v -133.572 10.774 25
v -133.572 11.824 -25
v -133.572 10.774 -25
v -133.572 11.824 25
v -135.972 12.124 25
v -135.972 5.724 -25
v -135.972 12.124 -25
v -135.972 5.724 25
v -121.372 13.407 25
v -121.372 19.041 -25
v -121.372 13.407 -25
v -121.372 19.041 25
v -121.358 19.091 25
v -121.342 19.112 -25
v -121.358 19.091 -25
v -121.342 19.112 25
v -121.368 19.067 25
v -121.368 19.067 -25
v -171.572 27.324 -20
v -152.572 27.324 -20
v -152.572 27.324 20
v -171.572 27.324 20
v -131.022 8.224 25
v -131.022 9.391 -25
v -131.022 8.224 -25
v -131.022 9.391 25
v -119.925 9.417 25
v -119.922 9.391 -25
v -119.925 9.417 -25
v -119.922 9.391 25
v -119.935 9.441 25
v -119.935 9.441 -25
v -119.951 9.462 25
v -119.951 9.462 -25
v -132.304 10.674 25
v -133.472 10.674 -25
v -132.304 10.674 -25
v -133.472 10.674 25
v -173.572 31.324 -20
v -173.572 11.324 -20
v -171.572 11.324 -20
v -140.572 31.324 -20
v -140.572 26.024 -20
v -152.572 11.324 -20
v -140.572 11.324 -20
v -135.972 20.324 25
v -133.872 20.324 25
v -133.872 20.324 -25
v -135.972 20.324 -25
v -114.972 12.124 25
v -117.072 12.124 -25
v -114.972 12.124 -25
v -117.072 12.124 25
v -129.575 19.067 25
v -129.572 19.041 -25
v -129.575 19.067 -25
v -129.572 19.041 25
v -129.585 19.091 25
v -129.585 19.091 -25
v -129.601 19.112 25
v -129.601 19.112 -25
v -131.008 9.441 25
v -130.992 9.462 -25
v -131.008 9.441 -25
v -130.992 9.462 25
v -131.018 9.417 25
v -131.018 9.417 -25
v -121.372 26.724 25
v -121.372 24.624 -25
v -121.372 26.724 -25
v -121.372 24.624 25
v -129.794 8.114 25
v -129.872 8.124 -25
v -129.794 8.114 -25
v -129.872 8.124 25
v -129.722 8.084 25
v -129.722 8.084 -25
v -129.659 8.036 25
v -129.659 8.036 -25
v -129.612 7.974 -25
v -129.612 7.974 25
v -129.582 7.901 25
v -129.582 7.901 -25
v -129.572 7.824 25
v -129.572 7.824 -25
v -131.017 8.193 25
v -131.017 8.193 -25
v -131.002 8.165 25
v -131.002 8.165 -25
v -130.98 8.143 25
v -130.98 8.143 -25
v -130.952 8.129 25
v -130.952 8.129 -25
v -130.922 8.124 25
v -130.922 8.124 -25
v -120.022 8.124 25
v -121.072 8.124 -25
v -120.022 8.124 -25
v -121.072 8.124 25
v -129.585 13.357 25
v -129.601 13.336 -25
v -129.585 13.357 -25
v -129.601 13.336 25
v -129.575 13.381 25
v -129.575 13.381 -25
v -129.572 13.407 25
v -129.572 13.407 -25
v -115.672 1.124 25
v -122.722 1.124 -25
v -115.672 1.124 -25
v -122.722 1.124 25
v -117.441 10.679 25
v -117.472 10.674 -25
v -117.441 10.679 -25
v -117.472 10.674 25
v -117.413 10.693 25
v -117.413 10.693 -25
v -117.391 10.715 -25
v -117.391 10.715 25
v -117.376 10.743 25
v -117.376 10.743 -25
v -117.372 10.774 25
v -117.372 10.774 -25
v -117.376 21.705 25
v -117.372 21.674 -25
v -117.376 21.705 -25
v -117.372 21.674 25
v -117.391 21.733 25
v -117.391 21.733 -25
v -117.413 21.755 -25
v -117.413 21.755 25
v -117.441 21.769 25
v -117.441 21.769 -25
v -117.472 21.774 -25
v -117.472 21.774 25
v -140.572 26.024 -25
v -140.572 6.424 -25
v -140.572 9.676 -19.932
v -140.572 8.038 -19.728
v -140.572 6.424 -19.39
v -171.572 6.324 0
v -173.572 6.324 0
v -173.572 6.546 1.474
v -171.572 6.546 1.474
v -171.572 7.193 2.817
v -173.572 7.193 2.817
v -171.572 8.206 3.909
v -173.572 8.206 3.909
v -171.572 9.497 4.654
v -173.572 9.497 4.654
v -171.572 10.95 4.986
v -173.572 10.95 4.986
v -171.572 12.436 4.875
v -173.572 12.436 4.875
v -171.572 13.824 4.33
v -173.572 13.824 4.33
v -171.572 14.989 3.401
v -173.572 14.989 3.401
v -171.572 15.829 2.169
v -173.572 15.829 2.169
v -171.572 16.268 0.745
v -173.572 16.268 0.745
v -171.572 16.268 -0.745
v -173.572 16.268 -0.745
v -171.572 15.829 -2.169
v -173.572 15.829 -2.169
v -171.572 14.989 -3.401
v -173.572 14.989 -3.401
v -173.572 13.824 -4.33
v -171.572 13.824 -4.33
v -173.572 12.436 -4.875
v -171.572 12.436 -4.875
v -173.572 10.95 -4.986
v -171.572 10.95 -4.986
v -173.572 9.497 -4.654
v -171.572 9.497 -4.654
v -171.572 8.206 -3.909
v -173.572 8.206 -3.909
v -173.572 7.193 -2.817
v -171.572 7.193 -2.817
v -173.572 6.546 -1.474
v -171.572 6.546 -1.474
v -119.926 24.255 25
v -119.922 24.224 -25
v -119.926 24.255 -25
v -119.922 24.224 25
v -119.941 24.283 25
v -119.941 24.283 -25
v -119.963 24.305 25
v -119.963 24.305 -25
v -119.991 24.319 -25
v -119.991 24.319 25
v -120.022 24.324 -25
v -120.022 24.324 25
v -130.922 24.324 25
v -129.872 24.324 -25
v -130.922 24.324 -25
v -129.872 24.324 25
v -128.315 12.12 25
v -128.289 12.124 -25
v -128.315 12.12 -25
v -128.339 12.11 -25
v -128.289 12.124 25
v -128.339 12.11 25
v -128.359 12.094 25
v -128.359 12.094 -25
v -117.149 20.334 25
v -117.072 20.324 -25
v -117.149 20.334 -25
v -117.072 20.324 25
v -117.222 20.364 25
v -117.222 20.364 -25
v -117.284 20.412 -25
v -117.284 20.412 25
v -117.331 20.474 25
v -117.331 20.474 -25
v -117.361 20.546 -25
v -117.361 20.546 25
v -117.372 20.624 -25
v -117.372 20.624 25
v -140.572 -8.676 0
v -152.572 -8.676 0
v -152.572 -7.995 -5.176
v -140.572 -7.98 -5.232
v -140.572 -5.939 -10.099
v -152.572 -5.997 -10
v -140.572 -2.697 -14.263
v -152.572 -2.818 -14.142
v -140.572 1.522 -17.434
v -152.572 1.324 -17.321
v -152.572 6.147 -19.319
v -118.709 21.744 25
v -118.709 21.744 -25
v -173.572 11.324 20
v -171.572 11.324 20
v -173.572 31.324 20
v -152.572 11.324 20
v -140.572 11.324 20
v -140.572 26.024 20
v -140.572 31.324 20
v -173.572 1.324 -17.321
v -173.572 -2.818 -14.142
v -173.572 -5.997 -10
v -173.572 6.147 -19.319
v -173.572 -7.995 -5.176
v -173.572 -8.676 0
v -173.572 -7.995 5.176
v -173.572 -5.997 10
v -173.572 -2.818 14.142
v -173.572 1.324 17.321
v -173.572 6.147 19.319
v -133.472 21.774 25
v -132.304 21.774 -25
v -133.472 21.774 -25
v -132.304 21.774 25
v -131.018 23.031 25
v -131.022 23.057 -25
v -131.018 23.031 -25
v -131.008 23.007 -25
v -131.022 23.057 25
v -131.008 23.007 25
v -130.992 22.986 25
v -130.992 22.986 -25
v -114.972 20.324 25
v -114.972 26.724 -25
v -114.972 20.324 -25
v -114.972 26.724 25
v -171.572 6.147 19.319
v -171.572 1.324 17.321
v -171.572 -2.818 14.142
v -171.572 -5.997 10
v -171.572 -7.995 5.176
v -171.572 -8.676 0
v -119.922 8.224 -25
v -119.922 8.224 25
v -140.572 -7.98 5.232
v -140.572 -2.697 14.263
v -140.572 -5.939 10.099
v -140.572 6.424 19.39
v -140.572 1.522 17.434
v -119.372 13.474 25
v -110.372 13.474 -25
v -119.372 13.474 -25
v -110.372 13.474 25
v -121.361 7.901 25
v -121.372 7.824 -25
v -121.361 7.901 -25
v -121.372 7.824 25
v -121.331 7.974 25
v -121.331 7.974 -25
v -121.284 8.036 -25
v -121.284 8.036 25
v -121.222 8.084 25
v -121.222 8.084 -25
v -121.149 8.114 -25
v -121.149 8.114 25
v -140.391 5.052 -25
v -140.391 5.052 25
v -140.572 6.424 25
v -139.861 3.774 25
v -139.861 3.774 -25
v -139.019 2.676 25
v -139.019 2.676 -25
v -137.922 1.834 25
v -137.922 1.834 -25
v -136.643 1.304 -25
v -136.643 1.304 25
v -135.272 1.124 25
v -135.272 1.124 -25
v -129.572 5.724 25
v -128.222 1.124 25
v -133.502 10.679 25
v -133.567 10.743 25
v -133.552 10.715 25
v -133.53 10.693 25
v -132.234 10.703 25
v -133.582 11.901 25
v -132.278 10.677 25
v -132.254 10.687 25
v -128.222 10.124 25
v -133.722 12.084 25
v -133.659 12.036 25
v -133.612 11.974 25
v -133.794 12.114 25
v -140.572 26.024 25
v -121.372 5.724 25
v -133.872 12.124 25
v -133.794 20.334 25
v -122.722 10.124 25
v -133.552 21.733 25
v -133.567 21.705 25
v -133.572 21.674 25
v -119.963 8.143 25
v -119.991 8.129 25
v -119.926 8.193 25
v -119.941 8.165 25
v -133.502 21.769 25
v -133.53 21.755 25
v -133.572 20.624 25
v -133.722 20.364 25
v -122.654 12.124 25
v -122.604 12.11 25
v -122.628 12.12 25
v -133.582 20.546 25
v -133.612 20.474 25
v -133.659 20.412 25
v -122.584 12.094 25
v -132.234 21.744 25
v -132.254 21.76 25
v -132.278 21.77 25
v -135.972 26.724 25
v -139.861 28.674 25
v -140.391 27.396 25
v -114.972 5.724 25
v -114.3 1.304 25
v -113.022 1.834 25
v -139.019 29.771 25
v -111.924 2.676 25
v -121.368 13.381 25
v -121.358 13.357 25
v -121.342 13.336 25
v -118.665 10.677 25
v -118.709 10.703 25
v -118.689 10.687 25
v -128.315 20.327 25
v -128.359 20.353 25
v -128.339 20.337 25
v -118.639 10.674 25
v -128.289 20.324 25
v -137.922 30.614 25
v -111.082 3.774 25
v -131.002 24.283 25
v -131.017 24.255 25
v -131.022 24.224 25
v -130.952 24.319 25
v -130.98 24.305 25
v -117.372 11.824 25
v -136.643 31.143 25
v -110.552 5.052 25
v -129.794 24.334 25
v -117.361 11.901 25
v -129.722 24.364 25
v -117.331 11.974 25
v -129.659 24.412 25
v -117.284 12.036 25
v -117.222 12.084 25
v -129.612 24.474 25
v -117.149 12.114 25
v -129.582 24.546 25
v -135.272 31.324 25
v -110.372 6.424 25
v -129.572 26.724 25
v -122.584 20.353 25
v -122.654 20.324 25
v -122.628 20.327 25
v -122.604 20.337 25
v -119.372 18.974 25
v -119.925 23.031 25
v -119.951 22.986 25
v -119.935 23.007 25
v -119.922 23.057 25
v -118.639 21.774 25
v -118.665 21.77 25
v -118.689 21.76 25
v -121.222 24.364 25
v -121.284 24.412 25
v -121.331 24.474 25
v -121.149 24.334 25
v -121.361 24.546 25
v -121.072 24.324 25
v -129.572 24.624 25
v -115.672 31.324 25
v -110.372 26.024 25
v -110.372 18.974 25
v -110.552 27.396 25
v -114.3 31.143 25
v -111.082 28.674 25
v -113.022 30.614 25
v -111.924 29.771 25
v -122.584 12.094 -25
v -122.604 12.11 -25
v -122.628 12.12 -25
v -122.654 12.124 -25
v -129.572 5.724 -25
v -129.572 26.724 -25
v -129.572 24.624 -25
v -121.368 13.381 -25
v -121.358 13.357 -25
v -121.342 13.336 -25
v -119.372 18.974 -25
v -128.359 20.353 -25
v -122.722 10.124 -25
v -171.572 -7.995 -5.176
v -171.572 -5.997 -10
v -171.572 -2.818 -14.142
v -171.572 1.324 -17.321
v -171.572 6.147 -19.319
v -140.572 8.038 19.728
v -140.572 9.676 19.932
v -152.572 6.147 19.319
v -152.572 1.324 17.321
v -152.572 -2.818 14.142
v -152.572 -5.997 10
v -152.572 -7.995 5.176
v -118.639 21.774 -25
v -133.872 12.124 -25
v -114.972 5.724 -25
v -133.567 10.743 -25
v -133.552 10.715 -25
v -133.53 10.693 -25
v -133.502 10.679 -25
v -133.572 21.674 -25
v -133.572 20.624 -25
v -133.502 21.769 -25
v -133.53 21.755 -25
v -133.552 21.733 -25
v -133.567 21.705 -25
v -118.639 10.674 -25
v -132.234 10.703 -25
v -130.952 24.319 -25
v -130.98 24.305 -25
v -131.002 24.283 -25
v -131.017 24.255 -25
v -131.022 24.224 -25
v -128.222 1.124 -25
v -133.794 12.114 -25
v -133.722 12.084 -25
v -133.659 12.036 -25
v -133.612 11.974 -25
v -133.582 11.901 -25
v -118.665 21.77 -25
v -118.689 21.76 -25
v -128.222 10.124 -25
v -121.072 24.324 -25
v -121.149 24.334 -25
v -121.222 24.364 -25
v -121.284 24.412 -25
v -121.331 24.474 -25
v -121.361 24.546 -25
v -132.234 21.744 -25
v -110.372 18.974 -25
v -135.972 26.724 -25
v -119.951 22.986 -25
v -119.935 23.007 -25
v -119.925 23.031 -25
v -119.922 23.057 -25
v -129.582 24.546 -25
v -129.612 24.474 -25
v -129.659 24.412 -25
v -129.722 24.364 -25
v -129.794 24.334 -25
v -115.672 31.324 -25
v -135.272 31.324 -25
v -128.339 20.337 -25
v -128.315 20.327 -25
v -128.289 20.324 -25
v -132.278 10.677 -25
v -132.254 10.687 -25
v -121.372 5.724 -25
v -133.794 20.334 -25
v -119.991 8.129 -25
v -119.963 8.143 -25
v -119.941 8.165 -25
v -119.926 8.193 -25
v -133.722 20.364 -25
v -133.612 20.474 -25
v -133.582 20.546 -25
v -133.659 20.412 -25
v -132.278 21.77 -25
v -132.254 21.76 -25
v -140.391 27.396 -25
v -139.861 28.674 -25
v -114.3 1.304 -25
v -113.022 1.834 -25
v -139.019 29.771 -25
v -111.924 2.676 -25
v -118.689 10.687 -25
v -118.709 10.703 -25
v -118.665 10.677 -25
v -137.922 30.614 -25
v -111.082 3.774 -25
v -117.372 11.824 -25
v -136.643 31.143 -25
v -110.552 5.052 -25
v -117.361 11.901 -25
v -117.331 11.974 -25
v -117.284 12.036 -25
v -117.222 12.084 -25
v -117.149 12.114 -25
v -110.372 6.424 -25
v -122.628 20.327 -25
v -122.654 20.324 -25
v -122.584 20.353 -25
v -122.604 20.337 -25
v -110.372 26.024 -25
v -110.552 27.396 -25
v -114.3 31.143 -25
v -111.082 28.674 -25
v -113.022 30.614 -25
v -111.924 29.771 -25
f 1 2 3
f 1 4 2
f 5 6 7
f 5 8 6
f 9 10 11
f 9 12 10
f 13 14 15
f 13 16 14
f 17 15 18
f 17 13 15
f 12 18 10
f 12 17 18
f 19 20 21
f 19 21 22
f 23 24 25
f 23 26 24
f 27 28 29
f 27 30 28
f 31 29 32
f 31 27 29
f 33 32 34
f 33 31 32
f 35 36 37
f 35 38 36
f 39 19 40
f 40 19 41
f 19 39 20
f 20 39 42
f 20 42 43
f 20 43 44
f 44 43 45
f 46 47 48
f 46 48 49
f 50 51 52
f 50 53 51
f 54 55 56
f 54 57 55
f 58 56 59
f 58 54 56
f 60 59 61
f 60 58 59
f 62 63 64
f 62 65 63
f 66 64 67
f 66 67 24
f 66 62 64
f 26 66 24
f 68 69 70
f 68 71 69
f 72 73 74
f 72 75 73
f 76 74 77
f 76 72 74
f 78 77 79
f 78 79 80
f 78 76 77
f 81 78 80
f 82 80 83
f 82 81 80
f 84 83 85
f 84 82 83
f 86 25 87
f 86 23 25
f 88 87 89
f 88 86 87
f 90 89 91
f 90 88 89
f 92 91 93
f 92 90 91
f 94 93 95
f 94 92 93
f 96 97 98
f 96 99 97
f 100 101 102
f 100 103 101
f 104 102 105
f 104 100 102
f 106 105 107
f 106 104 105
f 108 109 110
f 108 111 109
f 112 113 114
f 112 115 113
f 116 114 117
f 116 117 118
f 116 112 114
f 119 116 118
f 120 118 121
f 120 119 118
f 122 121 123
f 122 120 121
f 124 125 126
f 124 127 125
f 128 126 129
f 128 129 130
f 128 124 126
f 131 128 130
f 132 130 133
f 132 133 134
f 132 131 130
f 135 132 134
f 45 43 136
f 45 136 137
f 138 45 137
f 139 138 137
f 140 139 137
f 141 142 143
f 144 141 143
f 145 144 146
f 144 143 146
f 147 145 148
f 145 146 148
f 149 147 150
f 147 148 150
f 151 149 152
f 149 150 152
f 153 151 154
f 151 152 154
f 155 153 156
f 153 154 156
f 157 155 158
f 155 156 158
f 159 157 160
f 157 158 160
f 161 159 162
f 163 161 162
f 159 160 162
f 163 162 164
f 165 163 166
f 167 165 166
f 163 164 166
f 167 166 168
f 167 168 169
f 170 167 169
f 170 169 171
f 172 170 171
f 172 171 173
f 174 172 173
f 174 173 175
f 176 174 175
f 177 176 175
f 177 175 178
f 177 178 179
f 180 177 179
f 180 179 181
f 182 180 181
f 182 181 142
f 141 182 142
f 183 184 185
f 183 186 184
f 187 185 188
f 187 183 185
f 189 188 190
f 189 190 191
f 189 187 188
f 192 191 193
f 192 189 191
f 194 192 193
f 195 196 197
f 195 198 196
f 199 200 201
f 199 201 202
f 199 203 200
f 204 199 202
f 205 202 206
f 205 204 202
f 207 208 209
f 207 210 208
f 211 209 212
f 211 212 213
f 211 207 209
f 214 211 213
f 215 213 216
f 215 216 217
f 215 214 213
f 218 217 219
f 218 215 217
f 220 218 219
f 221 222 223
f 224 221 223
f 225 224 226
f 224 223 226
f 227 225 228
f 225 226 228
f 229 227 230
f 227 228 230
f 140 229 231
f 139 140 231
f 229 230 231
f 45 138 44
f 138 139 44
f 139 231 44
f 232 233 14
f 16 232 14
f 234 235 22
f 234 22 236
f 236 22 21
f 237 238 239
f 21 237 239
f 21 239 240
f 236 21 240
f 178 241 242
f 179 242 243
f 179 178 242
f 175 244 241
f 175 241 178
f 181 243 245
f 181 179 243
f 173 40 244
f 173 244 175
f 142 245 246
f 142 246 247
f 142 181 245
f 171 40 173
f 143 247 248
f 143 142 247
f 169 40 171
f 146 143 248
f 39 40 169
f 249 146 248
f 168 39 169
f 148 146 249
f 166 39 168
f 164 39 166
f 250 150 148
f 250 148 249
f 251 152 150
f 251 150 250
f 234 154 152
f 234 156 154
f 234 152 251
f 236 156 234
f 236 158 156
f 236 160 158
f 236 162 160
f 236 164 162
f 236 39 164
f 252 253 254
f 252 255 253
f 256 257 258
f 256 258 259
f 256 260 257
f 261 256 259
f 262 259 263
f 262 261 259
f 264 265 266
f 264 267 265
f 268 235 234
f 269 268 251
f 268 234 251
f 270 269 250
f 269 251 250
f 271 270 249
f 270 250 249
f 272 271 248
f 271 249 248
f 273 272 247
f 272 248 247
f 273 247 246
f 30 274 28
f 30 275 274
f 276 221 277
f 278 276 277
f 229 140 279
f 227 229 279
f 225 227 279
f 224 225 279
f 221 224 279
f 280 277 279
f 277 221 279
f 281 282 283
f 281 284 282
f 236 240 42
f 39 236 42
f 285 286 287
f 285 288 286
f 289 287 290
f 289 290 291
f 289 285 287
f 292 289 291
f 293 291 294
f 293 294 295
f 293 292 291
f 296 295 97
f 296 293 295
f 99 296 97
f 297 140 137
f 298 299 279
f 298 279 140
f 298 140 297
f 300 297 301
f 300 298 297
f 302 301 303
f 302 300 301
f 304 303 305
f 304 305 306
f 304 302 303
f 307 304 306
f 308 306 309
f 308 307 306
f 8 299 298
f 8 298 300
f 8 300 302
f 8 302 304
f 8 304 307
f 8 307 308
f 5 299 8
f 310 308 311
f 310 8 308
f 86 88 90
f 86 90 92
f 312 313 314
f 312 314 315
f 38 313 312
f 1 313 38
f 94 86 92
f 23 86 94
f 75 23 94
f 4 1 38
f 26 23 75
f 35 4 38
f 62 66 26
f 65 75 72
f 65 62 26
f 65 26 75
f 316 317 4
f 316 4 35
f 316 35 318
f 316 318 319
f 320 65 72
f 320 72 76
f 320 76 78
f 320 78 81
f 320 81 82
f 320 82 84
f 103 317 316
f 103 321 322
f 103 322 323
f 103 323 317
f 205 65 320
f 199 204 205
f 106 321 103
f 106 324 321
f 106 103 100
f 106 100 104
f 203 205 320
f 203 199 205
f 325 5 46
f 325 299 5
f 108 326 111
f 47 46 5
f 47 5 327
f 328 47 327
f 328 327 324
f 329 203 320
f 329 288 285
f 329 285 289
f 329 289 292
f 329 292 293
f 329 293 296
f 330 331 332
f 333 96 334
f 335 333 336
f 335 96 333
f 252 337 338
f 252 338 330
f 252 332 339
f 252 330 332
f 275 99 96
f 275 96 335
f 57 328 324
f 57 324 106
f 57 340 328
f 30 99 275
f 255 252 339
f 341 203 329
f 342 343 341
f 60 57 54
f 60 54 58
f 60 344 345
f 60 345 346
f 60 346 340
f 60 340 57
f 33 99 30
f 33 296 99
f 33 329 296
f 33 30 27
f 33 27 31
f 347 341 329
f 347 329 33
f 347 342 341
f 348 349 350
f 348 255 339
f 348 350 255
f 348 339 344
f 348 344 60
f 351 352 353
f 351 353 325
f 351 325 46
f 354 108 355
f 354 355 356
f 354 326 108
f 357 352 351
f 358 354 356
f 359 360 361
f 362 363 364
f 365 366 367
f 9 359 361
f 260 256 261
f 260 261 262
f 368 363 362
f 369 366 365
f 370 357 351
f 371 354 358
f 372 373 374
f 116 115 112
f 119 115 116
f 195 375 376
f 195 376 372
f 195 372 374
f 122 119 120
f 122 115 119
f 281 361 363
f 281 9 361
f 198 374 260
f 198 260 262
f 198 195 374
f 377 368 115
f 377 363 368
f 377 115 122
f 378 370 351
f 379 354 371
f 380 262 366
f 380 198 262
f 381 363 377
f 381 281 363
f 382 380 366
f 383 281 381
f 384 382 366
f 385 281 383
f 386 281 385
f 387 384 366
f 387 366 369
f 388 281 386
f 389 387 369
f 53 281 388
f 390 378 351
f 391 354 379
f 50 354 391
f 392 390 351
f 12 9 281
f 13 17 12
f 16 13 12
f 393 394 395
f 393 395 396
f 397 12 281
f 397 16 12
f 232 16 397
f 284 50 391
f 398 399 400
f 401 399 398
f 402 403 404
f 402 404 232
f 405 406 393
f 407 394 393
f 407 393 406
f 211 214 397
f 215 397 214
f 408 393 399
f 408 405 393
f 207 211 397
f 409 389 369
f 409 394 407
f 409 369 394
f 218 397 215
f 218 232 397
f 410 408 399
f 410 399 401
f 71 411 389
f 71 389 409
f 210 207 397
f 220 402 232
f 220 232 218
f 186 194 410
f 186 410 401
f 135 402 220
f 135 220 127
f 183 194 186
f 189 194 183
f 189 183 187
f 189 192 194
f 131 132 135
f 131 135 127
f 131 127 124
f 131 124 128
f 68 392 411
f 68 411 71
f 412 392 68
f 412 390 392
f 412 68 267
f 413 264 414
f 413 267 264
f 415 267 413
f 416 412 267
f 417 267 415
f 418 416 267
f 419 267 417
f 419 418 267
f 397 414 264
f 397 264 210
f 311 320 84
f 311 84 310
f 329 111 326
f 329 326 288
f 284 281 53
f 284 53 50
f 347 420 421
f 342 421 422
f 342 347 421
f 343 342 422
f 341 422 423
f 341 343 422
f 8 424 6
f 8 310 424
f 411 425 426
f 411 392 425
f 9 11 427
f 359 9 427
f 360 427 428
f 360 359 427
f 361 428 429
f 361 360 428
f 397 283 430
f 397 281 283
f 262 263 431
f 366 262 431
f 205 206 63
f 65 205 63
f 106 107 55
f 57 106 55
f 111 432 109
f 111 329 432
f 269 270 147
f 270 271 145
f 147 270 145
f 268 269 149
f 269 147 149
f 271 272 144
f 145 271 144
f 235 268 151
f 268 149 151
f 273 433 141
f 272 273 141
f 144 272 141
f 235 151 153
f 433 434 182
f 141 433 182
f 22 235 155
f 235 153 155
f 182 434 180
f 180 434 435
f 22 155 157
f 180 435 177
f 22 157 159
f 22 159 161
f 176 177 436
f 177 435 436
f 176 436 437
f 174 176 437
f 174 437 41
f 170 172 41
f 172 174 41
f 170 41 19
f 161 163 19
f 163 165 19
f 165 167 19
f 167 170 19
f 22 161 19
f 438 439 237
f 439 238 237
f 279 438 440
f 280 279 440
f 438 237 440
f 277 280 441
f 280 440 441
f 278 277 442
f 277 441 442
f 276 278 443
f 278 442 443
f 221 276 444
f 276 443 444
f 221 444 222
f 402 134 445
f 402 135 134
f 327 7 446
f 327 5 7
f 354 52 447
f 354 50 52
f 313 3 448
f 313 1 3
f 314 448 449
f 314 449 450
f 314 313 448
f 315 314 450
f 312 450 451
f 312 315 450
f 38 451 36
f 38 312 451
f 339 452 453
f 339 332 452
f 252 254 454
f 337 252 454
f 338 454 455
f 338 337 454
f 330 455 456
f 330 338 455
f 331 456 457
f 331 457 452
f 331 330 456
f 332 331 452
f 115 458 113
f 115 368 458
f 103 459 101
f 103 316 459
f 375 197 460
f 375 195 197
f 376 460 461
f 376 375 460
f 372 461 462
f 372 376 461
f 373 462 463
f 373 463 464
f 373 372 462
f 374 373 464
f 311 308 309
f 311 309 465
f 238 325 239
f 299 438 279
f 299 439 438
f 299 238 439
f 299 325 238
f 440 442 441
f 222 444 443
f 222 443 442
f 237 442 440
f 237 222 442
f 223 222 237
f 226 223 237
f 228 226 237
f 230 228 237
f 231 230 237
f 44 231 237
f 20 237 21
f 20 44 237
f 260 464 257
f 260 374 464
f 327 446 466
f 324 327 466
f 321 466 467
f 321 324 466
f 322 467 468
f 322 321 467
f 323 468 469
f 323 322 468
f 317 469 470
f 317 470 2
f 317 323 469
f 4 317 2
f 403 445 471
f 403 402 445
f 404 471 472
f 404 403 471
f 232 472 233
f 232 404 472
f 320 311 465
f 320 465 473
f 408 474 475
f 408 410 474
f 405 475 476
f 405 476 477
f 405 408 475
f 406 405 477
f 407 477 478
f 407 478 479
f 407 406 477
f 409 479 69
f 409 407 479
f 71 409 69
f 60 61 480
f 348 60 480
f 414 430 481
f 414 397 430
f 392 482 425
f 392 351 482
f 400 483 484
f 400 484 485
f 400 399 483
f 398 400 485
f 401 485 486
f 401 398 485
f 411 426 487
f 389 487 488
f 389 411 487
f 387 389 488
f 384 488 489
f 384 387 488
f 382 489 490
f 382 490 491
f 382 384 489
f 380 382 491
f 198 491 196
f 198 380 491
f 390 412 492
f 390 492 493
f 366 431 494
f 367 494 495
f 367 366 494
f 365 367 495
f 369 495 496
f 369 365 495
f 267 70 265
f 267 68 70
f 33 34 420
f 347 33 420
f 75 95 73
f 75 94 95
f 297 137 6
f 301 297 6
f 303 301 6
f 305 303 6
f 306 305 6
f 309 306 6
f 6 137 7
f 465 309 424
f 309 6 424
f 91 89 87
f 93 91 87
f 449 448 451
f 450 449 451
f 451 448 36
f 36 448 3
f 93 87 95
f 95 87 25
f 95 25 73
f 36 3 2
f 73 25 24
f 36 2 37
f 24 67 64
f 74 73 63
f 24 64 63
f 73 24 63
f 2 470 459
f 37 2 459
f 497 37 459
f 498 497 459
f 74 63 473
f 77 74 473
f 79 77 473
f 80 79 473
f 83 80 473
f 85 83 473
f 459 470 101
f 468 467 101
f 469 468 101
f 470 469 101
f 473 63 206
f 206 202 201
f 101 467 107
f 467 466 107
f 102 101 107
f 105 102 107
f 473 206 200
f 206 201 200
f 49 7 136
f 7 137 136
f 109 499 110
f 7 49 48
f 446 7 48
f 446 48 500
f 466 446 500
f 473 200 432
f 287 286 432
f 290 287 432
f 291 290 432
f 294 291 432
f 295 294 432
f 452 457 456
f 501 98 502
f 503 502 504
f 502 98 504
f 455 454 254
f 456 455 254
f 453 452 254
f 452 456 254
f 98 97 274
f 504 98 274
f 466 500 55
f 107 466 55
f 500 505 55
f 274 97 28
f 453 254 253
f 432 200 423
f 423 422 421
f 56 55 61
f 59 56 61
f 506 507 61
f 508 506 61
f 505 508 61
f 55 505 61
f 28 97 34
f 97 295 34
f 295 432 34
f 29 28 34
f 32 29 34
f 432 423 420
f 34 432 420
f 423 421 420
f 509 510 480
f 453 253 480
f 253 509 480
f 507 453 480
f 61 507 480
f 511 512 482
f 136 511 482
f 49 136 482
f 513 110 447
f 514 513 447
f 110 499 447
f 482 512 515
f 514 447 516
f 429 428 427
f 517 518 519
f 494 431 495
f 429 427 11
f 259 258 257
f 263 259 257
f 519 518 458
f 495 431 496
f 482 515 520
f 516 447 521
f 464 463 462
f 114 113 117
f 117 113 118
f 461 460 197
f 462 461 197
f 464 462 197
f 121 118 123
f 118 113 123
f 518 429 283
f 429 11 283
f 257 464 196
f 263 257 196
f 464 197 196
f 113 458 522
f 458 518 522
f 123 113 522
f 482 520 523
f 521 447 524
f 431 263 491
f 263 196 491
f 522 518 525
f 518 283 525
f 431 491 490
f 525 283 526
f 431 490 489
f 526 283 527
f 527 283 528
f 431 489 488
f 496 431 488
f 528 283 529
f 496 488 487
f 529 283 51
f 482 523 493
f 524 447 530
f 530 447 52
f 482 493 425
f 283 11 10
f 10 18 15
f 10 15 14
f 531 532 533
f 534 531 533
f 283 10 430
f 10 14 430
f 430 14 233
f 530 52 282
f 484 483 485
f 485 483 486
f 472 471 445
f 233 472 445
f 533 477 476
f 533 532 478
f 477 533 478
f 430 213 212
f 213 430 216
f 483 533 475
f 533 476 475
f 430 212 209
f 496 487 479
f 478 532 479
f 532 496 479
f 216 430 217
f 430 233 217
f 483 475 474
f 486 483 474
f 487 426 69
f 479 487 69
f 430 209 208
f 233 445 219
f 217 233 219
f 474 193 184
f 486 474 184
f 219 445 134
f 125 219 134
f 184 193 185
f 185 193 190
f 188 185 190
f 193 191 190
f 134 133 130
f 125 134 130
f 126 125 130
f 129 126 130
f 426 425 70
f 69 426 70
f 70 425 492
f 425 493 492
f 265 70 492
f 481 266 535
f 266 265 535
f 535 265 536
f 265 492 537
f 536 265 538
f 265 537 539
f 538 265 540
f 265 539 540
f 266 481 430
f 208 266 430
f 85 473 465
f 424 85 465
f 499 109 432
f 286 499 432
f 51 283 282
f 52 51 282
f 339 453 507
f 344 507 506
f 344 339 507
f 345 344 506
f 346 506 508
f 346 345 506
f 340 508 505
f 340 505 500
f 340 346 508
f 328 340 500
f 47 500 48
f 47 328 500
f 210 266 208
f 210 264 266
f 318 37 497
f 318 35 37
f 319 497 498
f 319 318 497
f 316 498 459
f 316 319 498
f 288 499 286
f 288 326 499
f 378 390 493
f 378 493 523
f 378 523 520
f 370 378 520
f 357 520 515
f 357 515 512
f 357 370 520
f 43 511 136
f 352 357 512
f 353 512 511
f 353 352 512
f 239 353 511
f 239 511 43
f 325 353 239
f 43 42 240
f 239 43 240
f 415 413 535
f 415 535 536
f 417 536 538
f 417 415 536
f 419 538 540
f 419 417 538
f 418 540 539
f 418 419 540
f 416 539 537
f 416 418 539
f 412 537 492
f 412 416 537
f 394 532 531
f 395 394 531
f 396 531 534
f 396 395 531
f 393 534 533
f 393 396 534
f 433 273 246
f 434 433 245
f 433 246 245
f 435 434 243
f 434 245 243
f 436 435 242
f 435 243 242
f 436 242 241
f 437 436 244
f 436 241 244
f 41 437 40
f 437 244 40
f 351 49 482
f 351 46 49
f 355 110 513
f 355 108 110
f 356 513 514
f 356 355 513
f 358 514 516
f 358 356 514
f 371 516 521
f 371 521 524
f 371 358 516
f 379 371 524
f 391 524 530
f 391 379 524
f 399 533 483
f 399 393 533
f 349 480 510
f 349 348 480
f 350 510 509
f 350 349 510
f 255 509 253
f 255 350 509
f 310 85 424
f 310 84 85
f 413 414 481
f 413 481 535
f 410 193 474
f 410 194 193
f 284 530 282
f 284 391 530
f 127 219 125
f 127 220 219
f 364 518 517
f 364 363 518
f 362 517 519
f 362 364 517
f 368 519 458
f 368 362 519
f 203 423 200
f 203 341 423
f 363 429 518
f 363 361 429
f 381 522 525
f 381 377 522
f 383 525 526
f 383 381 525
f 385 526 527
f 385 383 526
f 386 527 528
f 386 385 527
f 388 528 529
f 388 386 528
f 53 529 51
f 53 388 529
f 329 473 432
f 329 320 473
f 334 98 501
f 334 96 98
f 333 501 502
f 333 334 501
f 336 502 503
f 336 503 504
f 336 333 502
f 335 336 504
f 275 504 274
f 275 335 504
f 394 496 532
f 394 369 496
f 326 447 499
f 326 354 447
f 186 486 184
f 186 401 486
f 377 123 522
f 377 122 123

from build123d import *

# Parameters (mm, degrees)
Y_KSEKLIK_EKSTR_ZYON3_DEPTH       = 25
IZIM8_W                           = 20
IZIM8_H                           = 5.3
IZIM8_H_2                         = 14.7
IZIM8_H_3                         = 15.1
IZIM8_H_4                         = 4.9
Y_KSEKLIK_EKSTR_ZYON4_DEPTH       = 33
IZIM9_W                           = 19
IZIM9_H                           = 36
KES_EKSTR_ZYON1_DEPTH             = 36
IZIM11_R                          = 5
KES_EKSTR_ZYON3_DEPTH             = 10
IZIM12_W                          = 19
IZIM12_H                          = 36
KES_EKSTR_ZYON4_DEPTH             = 93
KES_EKSTR_ZYON5_REACH             = 76.836
KES_EKSTR_ZYON5_DIRECTION_2_DEPTH = 2


with BuildPart() as part:
    # Çizim6 → Yükseklik-Ekstrüzyon3 (new, symmetric)
    with BuildSketch(Plane.XY):
        with BuildLine():
            Line((-119.371512251, 18.973770729), (-115.371512251, 18.973770729))
            Line((-115.371512251, 18.973770729), (-110.371512251, 18.973770729))
            Line((-110.371512251, 18.973770729), (-110.371512251, 20.773770729))
            Line((-110.371512251, 20.773770729), (-110.371512251, 26.023770729))
            ThreePointArc((-110.371512251, 26.023770729), (-111.92384631, 29.771436669), (-115.671512251, 31.323770729))
            Line((-115.671512251, 31.323770729), (-120.921512251, 31.323770729))
            Line((-120.921512251, 31.323770729), (-122.721512251, 31.323770729))
            Line((-122.721512251, 31.323770729), (-128.221512251, 31.323770729))
            Line((-128.221512251, 31.323770729), (-130.021512251, 31.323770729))
            Line((-130.021512251, 31.323770729), (-135.271512251, 31.323770729))
            ThreePointArc((-135.271512251, 31.323770729), (-139.019178191, 29.771436669), (-140.571512251, 26.023770729))
            Line((-140.571512251, 26.023770729), (-140.571512251, 20.773770729))
            Line((-140.571512251, 20.773770729), (-140.571512251, 16.223770729))
            Line((-140.571512251, 16.223770729), (-140.571512251, 11.673770729))
            Line((-140.571512251, 11.673770729), (-140.571512251, 6.423770729))
            ThreePointArc((-140.571512251, 6.423770729), (-139.019178191, 2.676104789), (-135.271512251, 1.123770729))
            Line((-135.271512251, 1.123770729), (-130.021512251, 1.123770729))
            Line((-130.021512251, 1.123770729), (-128.221512251, 1.123770729))
            Line((-128.221512251, 1.123770729), (-128.221512251, 6.123770729))
            Line((-128.221512251, 6.123770729), (-128.221512251, 10.123770729))
            Line((-128.221512251, 10.123770729), (-122.721512251, 10.123770729))
            Line((-122.721512251, 10.123770729), (-122.721512251, 6.123770729))
            Line((-122.721512251, 6.123770729), (-122.721512251, 1.123770729))
            Line((-122.721512251, 1.123770729), (-120.921512251, 1.123770729))
            Line((-120.921512251, 1.123770729), (-115.671512251, 1.123770729))
            ThreePointArc((-115.671512251, 1.123770729), (-111.92384631, 2.676104789), (-110.371512251, 6.423770729))
            Line((-110.371512251, 6.423770729), (-110.371512251, 11.673770729))
            Line((-110.371512251, 11.673770729), (-110.371512251, 13.473770729))
            Line((-110.371512251, 13.473770729), (-115.371512251, 13.473770729))
            Line((-115.371512251, 13.473770729), (-119.371512251, 13.473770729))
            Line((-119.371512251, 13.473770729), (-119.371512251, 18.973770729))
        make_face()
        with BuildLine():
            Line((-133.871512251, 20.323770729), (-135.071512251, 20.323770729))
            Line((-135.071512251, 20.323770729), (-135.871512251, 20.323770729))
            Line((-135.871512251, 20.323770729), (-135.971512251, 20.323770729))
            Line((-135.971512251, 20.323770729), (-135.971512251, 26.723770729))
            Line((-135.971512251, 26.723770729), (-129.571512251, 26.723770729))
            Line((-129.571512251, 26.723770729), (-129.571512251, 26.623770729))
            Line((-129.571512251, 26.623770729), (-129.571512251, 25.823770729))
            Line((-129.571512251, 25.823770729), (-129.571512251, 24.623770729))
            ThreePointArc((-129.571512251, 24.623770729), (-129.659380216, 24.411638694), (-129.871512251, 24.323770729))
            Line((-129.871512251, 24.323770729), (-130.921512251, 24.323770729))
            ThreePointArc((-130.921512251, 24.323770729), (-130.992222929, 24.294481407), (-131.021512251, 24.223770729))
            Line((-131.021512251, 24.223770729), (-131.021512251, 23.056613441))
            ThreePointArc((-131.021512251, 23.056613441), (-131.013900204, 23.018345098), (-130.992222929, 22.985902763))
            Line((-130.992222929, 22.985902763), (-128.359380216, 20.353060051))
            ThreePointArc((-128.359380216, 20.353060051), (-128.326937882, 20.331382776), (-128.288669538, 20.323770729))
            Line((-128.288669538, 20.323770729), (-122.654354963, 20.323770729))
            ThreePointArc((-122.654354963, 20.323770729), (-122.61608662, 20.331382776), (-122.583644285, 20.353060051))
            Line((-122.583644285, 20.353060051), (-119.950801573, 22.985902763))
            ThreePointArc((-119.950801573, 22.985902763), (-119.929124298, 23.018345098), (-119.921512251, 23.056613441))
            Line((-119.921512251, 23.056613441), (-119.921512251, 24.223770729))
            ThreePointArc((-119.921512251, 24.223770729), (-119.950801573, 24.294481407), (-120.021512251, 24.323770729))
            Line((-120.021512251, 24.323770729), (-121.071512251, 24.323770729))
            ThreePointArc((-121.071512251, 24.323770729), (-121.283644285, 24.411638694), (-121.371512251, 24.623770729))
            Line((-121.371512251, 24.623770729), (-121.371512251, 25.823770729))
            Line((-121.371512251, 25.823770729), (-121.371512251, 26.323770729))
            Line((-121.371512251, 26.323770729), (-121.371512251, 26.723770729))
            Line((-121.371512251, 26.723770729), (-114.971512251, 26.723770729))
            Line((-114.971512251, 26.723770729), (-114.971512251, 20.323770729))
            Line((-114.971512251, 20.323770729), (-115.371512251, 20.323770729))
            Line((-115.371512251, 20.323770729), (-115.871512251, 20.323770729))
            Line((-115.871512251, 20.323770729), (-117.071512251, 20.323770729))
            ThreePointArc((-117.071512251, 20.323770729), (-117.283644285, 20.411638694), (-117.371512251, 20.623770729))
            Line((-117.371512251, 20.623770729), (-117.371512251, 21.673770729))
            ThreePointArc((-117.371512251, 21.673770729), (-117.400801573, 21.744481407), (-117.471512251, 21.773770729))
            Line((-117.471512251, 21.773770729), (-118.638669538, 21.773770729))
            ThreePointArc((-118.638669538, 21.773770729), (-118.676937882, 21.766158682), (-118.709380216, 21.744481407))
            Line((-118.709380216, 21.744481407), (-121.342222929, 19.111638694))
            ThreePointArc((-121.342222929, 19.111638694), (-121.363900204, 19.07919636), (-121.371512251, 19.040928016))
            Line((-121.371512251, 19.040928016), (-121.371512251, 13.406613441))
            ThreePointArc((-121.371512251, 13.406613441), (-121.363900204, 13.368345098), (-121.342222929, 13.335902763))
            Line((-121.342222929, 13.335902763), (-118.709380216, 10.703060051))
            ThreePointArc((-118.709380216, 10.703060051), (-118.676937882, 10.681382776), (-118.638669538, 10.673770729))
            Line((-118.638669538, 10.673770729), (-117.471512251, 10.673770729))
            ThreePointArc((-117.471512251, 10.673770729), (-117.400801573, 10.703060051), (-117.371512251, 10.773770729))
            Line((-117.371512251, 10.773770729), (-117.371512251, 11.823770729))
            ThreePointArc((-117.371512251, 11.823770729), (-117.283644285, 12.035902763), (-117.071512251, 12.123770729))
            Line((-117.071512251, 12.123770729), (-115.871512251, 12.123770729))
            Line((-115.871512251, 12.123770729), (-115.371512251, 12.123770729))
            Line((-115.371512251, 12.123770729), (-114.971512251, 12.123770729))
            Line((-114.971512251, 12.123770729), (-114.971512251, 5.723770729))
            Line((-114.971512251, 5.723770729), (-121.371512251, 5.723770729))
            Line((-121.371512251, 5.723770729), (-121.371512251, 6.123770729))
            Line((-121.371512251, 6.123770729), (-121.371512251, 6.623770729))
            Line((-121.371512251, 6.623770729), (-121.371512251, 7.823770729))
            ThreePointArc((-121.371512251, 7.823770729), (-121.283644285, 8.035902763), (-121.071512251, 8.123770729))
            Line((-121.071512251, 8.123770729), (-120.021512251, 8.123770729))
            ThreePointArc((-120.021512251, 8.123770729), (-119.950801573, 8.153060051), (-119.921512251, 8.223770729))
            Line((-119.921512251, 8.223770729), (-119.921512251, 9.390928016))
            ThreePointArc((-119.921512251, 9.390928016), (-119.929124298, 9.42919636), (-119.950801573, 9.461638694))
            Line((-119.950801573, 9.461638694), (-122.583644285, 12.094481407))
            ThreePointArc((-122.583644285, 12.094481407), (-122.61608662, 12.116158682), (-122.654354963, 12.123770729))
            Line((-122.654354963, 12.123770729), (-128.288669538, 12.123770729))
            ThreePointArc((-128.288669538, 12.123770729), (-128.326937882, 12.116158682), (-128.359380216, 12.094481407))
            Line((-128.359380216, 12.094481407), (-130.992222929, 9.461638694))
            ThreePointArc((-130.992222929, 9.461638694), (-131.013900204, 9.42919636), (-131.021512251, 9.390928016))
            Line((-131.021512251, 9.390928016), (-131.021512251, 8.223770729))
            ThreePointArc((-131.021512251, 8.223770729), (-130.992222929, 8.153060051), (-130.921512251, 8.123770729))
            Line((-130.921512251, 8.123770729), (-129.871512251, 8.123770729))
            ThreePointArc((-129.871512251, 8.123770729), (-129.659380216, 8.035902763), (-129.571512251, 7.823770729))
            Line((-129.571512251, 7.823770729), (-129.571512251, 6.623770729))
            Line((-129.571512251, 6.623770729), (-129.571512251, 6.123770729))
            Line((-129.571512251, 6.123770729), (-129.571512251, 5.723770729))
            Line((-129.571512251, 5.723770729), (-135.971512251, 5.723770729))
            Line((-135.971512251, 5.723770729), (-135.971512251, 12.123770729))
            Line((-135.971512251, 12.123770729), (-135.571512251, 12.123770729))
            Line((-135.571512251, 12.123770729), (-135.071512251, 12.123770729))
            Line((-135.071512251, 12.123770729), (-133.871512251, 12.123770729))
            ThreePointArc((-133.871512251, 12.123770729), (-133.659380216, 12.035902763), (-133.571512251, 11.823770729))
            Line((-133.571512251, 11.823770729), (-133.571512251, 10.773770729))
            ThreePointArc((-133.571512251, 10.773770729), (-133.542222929, 10.703060051), (-133.471512251, 10.673770729))
            Line((-133.471512251, 10.673770729), (-132.304354963, 10.673770729))
            ThreePointArc((-132.304354963, 10.673770729), (-132.26608662, 10.681382776), (-132.233644285, 10.703060051))
            Line((-132.233644285, 10.703060051), (-129.600801573, 13.335902763))
            ThreePointArc((-129.600801573, 13.335902763), (-129.579124298, 13.368345098), (-129.571512251, 13.406613441))
            Line((-129.571512251, 13.406613441), (-129.571512251, 19.040928016))
            ThreePointArc((-129.571512251, 19.040928016), (-129.579124298, 19.07919636), (-129.600801573, 19.111638694))
            Line((-129.600801573, 19.111638694), (-132.233644285, 21.744481407))
            ThreePointArc((-132.233644285, 21.744481407), (-132.26608662, 21.766158682), (-132.304354963, 21.773770729))
            Line((-132.304354963, 21.773770729), (-133.471512251, 21.773770729))
            ThreePointArc((-133.471512251, 21.773770729), (-133.542222929, 21.744481407), (-133.571512251, 21.673770729))
            Line((-133.571512251, 21.673770729), (-133.571512251, 20.623770729))
            ThreePointArc((-133.571512251, 20.623770729), (-133.659380216, 20.411638694), (-133.871512251, 20.323770729))
        make_face(mode=Mode.SUBTRACT)
    extrude(amount=Y_KSEKLIK_EKSTR_ZYON3_DEPTH, both=True)

    # Çizim8 → Yükseklik-Ekstrüzyon4 (add)
    with BuildSketch(Plane.ZY.offset(140.571512251)):
        with Locations((-10, 28.673770729)):
            Rectangle(IZIM8_W, IZIM8_H)
        with Locations((10, 28.673770729)):
            Rectangle(IZIM8_W, IZIM8_H)
        with Locations((10, 18.673770729)):
            Rectangle(IZIM8_W, IZIM8_H_2)
        with Locations((-10, 18.673770729)):
            Rectangle(IZIM8_W, IZIM8_H_2)
        with Locations((-10, -1.126229271)):
            Rectangle(IZIM8_W, IZIM8_H_3)
        with Locations((-10, 8.873770729)):
            Rectangle(IZIM8_W, IZIM8_H_4)
        with Locations((10, 8.873770729)):
            Rectangle(IZIM8_W, IZIM8_H_4)
        with Locations((10, -1.126229271)):
            Rectangle(IZIM8_W, IZIM8_H_3)
    extrude(amount=Y_KSEKLIK_EKSTR_ZYON4_DEPTH)

    # Çizim9 → Kes-Ekstrüzyon1 (cut)
    with BuildSketch(Plane.XZ.offset(8.676229271)):
        with Locations((-162.071512251, 0)):
            Rectangle(IZIM9_W, IZIM9_H)
    extrude(amount=-KES_EKSTR_ZYON1_DEPTH, mode=Mode.SUBTRACT)

    # Çizim11 → Kes-Ekstrüzyon3 (cut)
    with BuildSketch(Plane.ZY.offset(173.571512251)):
        with Locations(Location((0, 11.323770729, 0), (0, 0, 270))):
            Circle(IZIM11_R)
    extrude(amount=-KES_EKSTR_ZYON3_DEPTH, mode=Mode.SUBTRACT)

    # Çizim12 → Kes-Ekstrüzyon4 (cut)
    with BuildSketch(Plane(origin=(0, 0, -20), x_dir=(-1, 0, 0), z_dir=(0, 0, -1))):
        with Locations((162.071512251, 9.323770729)):
            Rectangle(IZIM12_W, IZIM12_H)
    extrude(amount=-KES_EKSTR_ZYON4_DEPTH, mode=Mode.SUBTRACT)

    # Kes-Ekstrüzyon5: up to this face of the body (flat: up to its plane)
    kes_ekstr_zyon5_end = Plane(part.part.faces().sort_by_distance((-140.571512251, -1.126229271, 0))[0])
    # Çizim13 → Kes-Ekstrüzyon5 (cut, up to the picked face)
    with BuildSketch(Plane.ZY.offset(173.571512251), mode=Mode.PRIVATE) as kes_ekstr_zyon5_sk1:
        with BuildLine():
            Line((-20, 11.323770729), (-20, -8.676229271))
            Line((-20, -8.676229271), (3.8e-08, -8.676229271))
            ThreePointArc((3.8e-08, -8.676229271), (-14.14213561, -2.818364908), (-20, 11.323770729))
        make_face()
    kes_ekstr_zyon5_tool1 = split(extrude(kes_ekstr_zyon5_sk1.sketch, amount=-KES_EKSTR_ZYON5_REACH, mode=Mode.PRIVATE), bisect_by=kes_ekstr_zyon5_end, keep=Keep.BOTH, mode=Mode.PRIVATE)
    # Çizim13 → Kes-Ekstrüzyon5 (cut, up to the picked face)
    with BuildSketch(Plane.ZY.offset(173.571512251), mode=Mode.PRIVATE) as kes_ekstr_zyon5_sk2:
        with BuildLine():
            ThreePointArc((20, 11.323770729), (14.142135637, -2.818364882), (3.8e-08, -8.676229271))
            Line((3.8e-08, -8.676229271), (20, -8.676229271))
            Line((20, -8.676229271), (20, 11.323770729))
        make_face()
    kes_ekstr_zyon5_tool2 = split(extrude(kes_ekstr_zyon5_sk2.sketch, amount=-KES_EKSTR_ZYON5_REACH, mode=Mode.PRIVATE), bisect_by=kes_ekstr_zyon5_end, keep=Keep.BOTH, mode=Mode.PRIVATE)
    add(kes_ekstr_zyon5_tool1.solids().sort_by(Axis((-173.571512, -4.20887, -15.532641), (1, 0, 0)))[0], mode=Mode.SUBTRACT)
    add(kes_ekstr_zyon5_tool2.solids().sort_by(Axis((-173.571512, -4.20887, 15.532641), (1, 0, 0)))[0], mode=Mode.SUBTRACT)

    # Çizim13 → Kes-Ekstrüzyon5 direction 2 (cut)
    with BuildSketch(Plane.ZY.offset(173.571512251)):
        with BuildLine():
            Line((-20, 11.323770729), (-20, -8.676229271))
            Line((-20, -8.676229271), (3.8e-08, -8.676229271))
            ThreePointArc((3.8e-08, -8.676229271), (-14.14213561, -2.818364908), (-20, 11.323770729))
        make_face()
        with BuildLine():
            ThreePointArc((20, 11.323770729), (14.142135637, -2.818364882), (3.8e-08, -8.676229271))
            Line((3.8e-08, -8.676229271), (20, -8.676229271))
            Line((20, -8.676229271), (20, 11.323770729))
        make_face()
    extrude(amount=KES_EKSTR_ZYON5_DIRECTION_2_DEPTH, mode=Mode.SUBTRACT)


solid = part.part
